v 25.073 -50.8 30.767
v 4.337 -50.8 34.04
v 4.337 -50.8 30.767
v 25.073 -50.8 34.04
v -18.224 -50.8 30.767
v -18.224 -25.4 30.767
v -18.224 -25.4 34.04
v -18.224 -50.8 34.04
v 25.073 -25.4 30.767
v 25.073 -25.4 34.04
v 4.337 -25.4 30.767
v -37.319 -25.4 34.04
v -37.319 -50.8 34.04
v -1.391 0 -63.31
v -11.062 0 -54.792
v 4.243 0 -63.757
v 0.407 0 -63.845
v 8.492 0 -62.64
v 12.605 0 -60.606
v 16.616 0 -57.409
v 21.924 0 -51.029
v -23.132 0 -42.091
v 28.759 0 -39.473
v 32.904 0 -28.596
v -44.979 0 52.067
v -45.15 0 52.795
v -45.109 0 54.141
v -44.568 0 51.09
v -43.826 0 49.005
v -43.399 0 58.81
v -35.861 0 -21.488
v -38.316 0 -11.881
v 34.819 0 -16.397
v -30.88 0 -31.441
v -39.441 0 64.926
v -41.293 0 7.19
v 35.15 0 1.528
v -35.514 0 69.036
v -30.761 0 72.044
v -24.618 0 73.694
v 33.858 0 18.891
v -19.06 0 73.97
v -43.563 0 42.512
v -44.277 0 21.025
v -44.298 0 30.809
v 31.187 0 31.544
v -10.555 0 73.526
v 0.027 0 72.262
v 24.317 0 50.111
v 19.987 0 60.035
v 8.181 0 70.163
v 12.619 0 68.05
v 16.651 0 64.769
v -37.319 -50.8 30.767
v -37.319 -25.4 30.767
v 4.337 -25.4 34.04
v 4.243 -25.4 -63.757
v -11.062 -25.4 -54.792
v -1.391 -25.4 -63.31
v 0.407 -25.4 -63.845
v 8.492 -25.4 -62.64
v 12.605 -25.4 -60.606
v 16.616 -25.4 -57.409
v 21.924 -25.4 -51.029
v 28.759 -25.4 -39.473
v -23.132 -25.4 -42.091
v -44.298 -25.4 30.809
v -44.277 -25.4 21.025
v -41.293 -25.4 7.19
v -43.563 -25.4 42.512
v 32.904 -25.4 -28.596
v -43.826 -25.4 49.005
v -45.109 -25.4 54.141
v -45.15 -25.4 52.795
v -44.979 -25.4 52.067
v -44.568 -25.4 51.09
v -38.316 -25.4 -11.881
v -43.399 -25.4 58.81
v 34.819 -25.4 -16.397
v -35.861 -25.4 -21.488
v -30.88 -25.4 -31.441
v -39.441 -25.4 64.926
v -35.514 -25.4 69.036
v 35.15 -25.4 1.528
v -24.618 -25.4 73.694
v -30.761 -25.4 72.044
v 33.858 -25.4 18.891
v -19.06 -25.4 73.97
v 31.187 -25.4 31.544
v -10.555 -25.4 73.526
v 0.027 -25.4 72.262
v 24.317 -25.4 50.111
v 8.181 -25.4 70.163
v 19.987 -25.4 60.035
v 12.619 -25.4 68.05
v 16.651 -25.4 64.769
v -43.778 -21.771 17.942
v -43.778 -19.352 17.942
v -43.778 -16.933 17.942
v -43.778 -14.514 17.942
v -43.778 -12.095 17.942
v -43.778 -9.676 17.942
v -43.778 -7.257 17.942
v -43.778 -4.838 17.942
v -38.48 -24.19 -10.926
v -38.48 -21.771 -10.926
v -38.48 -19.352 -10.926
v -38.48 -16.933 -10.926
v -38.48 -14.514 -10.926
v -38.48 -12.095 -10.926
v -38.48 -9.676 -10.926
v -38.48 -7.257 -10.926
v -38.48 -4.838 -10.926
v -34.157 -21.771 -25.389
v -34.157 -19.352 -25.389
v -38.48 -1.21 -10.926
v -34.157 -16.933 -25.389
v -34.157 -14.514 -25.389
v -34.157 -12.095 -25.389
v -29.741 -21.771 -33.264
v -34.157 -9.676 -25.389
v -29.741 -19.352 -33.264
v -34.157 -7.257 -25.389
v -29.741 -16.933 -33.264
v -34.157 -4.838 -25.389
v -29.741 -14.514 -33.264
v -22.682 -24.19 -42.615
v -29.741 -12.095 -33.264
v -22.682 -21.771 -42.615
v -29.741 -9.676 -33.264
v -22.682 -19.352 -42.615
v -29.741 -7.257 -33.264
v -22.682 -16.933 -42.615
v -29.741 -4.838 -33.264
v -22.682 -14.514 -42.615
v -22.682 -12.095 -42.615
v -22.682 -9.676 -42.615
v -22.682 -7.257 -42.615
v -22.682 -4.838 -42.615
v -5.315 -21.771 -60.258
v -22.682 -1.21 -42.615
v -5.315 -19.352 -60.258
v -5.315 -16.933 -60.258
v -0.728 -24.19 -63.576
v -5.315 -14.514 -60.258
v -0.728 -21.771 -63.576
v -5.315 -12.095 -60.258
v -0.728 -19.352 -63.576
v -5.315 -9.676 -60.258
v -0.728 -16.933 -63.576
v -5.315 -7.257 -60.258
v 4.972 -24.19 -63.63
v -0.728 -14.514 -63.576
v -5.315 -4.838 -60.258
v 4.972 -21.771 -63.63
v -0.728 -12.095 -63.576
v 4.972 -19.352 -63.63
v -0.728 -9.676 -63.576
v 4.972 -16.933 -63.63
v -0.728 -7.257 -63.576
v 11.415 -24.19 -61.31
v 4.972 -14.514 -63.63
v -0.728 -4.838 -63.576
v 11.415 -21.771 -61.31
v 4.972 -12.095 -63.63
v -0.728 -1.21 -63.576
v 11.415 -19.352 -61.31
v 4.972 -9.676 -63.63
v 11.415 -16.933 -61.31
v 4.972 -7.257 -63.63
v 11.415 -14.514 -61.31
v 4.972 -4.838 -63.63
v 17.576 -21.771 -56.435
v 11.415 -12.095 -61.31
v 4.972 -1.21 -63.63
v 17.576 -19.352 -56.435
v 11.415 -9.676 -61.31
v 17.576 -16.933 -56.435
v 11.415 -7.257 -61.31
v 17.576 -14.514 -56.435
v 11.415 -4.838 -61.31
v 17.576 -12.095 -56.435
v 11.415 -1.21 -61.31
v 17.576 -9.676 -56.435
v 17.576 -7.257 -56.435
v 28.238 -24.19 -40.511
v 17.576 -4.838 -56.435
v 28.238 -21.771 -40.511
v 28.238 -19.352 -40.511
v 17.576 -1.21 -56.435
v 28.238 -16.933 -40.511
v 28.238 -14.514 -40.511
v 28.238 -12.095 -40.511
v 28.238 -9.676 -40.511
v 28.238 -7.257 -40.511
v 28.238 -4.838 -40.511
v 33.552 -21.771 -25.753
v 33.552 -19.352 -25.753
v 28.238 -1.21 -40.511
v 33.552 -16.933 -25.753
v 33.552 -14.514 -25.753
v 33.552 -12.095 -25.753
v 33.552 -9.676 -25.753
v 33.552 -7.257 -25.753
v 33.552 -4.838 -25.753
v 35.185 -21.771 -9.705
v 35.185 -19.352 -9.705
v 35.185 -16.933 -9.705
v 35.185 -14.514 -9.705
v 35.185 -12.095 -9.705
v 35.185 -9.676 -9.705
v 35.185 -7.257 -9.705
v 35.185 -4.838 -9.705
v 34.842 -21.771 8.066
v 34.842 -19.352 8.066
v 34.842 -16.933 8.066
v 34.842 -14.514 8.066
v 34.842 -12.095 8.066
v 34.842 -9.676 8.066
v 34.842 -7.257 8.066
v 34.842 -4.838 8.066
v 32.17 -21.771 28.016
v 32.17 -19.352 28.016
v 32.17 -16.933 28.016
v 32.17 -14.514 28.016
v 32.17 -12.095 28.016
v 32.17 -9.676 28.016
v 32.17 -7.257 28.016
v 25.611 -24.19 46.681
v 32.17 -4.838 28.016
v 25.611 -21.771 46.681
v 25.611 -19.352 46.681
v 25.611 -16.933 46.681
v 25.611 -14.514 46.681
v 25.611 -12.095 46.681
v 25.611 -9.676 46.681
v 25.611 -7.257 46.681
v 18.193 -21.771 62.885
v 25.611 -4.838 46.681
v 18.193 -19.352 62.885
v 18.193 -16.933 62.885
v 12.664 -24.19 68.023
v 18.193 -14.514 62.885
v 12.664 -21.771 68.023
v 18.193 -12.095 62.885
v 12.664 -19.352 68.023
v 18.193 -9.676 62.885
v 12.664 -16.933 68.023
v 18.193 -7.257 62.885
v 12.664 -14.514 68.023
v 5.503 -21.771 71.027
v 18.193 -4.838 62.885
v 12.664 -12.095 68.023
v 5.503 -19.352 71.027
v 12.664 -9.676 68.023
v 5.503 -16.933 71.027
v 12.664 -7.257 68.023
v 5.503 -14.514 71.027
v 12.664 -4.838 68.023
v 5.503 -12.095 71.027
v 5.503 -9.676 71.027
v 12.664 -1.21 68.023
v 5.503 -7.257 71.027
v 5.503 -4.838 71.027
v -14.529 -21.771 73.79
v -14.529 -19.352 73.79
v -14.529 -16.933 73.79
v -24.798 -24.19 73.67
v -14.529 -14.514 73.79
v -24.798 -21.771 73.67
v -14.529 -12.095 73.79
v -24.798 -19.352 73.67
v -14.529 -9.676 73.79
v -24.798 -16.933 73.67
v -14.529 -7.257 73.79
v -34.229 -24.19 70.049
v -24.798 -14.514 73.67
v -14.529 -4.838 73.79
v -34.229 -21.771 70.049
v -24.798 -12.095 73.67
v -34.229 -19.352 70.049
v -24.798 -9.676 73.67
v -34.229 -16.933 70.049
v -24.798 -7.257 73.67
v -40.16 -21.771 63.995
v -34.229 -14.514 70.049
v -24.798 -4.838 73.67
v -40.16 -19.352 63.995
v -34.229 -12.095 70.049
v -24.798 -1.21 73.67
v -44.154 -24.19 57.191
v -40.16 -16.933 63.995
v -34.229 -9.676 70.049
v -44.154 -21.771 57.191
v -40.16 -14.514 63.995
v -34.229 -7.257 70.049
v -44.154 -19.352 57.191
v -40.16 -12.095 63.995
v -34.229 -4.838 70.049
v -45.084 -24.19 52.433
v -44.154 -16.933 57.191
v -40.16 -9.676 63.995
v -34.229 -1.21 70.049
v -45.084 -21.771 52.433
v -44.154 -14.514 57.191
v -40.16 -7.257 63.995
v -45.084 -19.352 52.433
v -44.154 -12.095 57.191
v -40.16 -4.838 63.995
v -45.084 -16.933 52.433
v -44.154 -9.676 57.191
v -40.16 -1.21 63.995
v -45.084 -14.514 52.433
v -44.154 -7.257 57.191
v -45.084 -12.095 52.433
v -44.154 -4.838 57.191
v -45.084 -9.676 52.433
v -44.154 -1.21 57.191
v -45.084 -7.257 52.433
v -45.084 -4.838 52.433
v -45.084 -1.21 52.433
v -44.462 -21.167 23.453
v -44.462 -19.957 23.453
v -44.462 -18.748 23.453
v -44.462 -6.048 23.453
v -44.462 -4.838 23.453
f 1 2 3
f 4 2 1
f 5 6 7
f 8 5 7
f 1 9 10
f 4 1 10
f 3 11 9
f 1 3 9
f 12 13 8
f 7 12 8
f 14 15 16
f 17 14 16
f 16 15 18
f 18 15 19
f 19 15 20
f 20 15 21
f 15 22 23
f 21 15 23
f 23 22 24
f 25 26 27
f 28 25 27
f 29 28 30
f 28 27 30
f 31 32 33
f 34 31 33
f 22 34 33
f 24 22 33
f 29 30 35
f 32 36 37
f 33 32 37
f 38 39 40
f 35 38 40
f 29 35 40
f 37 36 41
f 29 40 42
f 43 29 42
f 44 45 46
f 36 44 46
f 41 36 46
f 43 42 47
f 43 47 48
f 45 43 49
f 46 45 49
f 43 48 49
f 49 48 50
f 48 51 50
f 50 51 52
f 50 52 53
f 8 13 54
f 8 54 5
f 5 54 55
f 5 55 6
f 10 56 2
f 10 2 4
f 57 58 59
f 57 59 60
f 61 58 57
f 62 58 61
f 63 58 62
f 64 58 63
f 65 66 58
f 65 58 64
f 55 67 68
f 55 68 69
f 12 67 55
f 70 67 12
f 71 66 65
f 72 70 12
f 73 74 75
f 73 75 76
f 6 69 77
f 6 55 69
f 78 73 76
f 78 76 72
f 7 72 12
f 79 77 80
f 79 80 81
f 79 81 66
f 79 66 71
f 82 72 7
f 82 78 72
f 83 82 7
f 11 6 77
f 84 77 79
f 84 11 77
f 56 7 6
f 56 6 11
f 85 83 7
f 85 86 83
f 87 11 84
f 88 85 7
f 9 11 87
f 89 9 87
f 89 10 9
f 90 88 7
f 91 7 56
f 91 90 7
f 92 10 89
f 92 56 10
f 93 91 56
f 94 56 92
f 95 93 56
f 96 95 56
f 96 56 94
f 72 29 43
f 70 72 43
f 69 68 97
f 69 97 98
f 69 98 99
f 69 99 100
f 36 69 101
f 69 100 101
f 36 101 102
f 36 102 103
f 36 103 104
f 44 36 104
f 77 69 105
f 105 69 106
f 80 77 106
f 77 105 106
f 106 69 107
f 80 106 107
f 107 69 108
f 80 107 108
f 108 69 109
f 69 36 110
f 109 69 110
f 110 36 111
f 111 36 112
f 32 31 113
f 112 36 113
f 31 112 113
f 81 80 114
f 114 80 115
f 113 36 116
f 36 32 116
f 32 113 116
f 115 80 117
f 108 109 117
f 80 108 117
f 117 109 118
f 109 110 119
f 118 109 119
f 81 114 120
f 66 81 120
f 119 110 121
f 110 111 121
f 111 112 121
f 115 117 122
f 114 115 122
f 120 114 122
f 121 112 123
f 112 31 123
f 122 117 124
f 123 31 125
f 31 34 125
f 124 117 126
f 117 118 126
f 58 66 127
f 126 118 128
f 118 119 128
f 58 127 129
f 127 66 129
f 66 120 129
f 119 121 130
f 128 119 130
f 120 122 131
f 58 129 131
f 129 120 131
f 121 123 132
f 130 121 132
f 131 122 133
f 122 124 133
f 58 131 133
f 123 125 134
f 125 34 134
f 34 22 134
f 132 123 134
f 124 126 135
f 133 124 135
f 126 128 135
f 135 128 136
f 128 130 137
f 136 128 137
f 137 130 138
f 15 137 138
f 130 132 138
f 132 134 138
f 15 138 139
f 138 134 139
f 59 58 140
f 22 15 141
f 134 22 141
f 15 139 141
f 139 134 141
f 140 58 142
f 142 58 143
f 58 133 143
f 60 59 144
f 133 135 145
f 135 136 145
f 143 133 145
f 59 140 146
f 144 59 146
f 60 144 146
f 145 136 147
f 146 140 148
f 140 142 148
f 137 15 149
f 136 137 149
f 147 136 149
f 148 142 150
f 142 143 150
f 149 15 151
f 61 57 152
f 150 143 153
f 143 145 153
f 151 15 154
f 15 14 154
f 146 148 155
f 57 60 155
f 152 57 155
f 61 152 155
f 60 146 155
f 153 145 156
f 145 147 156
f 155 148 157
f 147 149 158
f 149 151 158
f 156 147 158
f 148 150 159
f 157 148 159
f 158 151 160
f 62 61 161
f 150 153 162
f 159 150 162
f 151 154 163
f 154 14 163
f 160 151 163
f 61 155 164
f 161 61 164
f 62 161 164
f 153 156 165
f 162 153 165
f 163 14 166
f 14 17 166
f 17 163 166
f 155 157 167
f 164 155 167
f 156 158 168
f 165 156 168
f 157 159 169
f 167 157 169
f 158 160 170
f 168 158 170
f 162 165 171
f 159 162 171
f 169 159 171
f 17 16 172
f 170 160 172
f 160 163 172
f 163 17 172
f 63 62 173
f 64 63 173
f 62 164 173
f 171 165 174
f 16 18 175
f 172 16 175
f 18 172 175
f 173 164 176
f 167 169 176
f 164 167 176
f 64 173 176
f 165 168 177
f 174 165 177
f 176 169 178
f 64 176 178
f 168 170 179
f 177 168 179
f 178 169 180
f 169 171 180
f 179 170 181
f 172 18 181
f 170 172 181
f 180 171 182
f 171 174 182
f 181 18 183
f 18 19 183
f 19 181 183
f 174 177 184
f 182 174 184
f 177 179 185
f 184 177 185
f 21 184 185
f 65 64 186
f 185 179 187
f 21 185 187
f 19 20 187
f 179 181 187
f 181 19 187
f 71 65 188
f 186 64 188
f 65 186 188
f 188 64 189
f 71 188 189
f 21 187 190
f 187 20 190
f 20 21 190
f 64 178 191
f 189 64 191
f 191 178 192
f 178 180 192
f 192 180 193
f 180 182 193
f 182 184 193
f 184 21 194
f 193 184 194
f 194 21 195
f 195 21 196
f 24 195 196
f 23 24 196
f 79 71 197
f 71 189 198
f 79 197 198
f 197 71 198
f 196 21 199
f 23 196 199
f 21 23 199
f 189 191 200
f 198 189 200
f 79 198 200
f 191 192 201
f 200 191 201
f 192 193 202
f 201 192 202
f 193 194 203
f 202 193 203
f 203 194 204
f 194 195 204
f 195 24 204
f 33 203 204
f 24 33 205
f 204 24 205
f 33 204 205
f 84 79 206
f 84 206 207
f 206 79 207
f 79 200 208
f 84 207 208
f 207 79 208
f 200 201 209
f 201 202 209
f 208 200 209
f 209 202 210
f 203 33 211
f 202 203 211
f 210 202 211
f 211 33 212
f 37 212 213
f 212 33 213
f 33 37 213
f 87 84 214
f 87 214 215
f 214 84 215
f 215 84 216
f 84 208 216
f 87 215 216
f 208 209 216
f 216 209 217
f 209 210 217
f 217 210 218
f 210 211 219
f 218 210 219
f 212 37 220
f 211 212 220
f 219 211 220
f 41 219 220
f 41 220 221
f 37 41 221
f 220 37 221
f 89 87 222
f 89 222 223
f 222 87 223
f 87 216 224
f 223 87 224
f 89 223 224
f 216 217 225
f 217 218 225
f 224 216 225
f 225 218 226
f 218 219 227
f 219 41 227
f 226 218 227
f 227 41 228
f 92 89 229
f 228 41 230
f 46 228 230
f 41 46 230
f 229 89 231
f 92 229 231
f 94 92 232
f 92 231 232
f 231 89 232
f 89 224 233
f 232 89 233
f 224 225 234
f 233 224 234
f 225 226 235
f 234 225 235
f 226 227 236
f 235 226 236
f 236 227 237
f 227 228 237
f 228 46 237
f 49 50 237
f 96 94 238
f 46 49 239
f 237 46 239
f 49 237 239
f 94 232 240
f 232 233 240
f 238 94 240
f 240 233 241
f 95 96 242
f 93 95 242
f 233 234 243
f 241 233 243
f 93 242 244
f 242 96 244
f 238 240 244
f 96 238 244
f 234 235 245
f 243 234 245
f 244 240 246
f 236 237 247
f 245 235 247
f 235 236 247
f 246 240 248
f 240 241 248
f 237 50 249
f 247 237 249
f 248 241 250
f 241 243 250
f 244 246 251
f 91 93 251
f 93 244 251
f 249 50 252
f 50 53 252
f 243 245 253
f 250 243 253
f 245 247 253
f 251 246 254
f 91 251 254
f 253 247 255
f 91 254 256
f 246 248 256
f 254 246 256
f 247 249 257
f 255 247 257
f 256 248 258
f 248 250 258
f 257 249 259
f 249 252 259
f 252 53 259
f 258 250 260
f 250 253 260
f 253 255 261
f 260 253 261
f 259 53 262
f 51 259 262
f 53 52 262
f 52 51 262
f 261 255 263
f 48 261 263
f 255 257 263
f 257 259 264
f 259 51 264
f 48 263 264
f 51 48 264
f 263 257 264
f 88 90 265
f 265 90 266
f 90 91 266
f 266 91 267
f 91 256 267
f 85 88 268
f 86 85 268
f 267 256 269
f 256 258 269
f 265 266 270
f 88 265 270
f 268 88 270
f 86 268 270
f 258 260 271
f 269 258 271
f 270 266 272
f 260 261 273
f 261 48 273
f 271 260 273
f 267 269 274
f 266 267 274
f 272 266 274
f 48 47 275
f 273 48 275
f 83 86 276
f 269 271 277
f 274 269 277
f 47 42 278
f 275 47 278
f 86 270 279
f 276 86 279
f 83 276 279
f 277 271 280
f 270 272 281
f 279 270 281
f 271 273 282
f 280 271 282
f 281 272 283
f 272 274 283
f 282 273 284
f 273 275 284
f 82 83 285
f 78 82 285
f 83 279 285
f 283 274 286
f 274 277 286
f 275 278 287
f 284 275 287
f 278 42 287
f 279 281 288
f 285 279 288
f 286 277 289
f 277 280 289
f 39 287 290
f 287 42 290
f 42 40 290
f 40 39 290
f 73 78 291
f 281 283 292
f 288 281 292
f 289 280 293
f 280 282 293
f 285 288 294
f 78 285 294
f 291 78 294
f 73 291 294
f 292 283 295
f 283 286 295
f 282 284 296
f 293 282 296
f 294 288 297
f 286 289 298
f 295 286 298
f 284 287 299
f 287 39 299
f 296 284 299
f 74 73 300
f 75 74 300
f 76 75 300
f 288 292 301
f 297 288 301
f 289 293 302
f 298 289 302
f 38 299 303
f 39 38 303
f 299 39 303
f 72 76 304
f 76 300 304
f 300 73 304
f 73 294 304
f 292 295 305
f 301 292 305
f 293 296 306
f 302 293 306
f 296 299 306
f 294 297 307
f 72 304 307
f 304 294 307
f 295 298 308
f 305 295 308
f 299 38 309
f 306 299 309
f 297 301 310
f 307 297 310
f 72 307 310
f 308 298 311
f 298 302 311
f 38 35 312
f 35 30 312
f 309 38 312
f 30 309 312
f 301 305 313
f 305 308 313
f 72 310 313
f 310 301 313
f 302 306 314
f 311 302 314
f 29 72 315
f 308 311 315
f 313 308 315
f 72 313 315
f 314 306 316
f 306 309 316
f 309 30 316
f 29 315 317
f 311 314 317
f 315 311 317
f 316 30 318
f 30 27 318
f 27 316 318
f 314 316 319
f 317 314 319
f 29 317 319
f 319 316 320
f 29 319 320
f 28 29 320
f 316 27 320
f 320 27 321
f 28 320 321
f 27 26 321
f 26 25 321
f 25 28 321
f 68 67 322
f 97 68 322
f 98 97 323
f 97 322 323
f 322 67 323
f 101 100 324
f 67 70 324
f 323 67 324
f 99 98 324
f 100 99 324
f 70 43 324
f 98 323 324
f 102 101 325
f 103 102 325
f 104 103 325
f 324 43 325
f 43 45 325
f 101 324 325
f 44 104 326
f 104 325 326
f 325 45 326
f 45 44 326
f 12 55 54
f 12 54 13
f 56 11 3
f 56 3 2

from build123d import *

# Parameters (mm, degrees)
F1_DEPTH = 25.4
F2_W     = 19.0945584327
F2_H     = 3.2732058316
F3_DEPTH = 25.4
F4_W     = 20.736461971
F4_H     = 3.2732058316
F5_DEPTH = 25.4


with BuildPart() as f1:
    # F0 (on Front) → F1 (new body)
    with BuildSketch(Plane.XZ):
        with BuildLine():
            add(Edge.make_bspline(
                [(-43.8256375492, 49.0054376423), (-42.7916469696, 44.173791818), (-46.1003508943, 22.2523463295), (-41.2365449541, 11.4018173918), (-38.4468794286, -15.0284204945), (-34.4404053019, -25.5549359592), (-25.5874273702, -41.0013375146), (-5.6752740256, -60.0394326793), (-0.5317638242, -64.582035161), (8.6317494058, -63.3059960665), (18.6127022363, -57.25258167), (29.7997063716, -38.8399710786), (34.0225700596, -26.046605234), (35.4974956894, -10.2236704325), (35.0854384121, 8.1301256606), (33.0903105303, 28.5585849949), (25.5295594833, 46.1545442627), (19.0780176286, 65.1810135254), (5.5546828919, 72.125873235), (-14.7286294195, 74.0832481465), (-35.1407015096, 74.4060534532), (-47.3435715893, 53.0785176575), (-44.2774492649, 51.1166698266), (-43.8256375492, 49.0054376423)],
                knots=[0, 0, 0, 0, 0.0591053589, 0.103607101, 0.1627736267, 0.2027891978, 0.2529713341, 0.3149714192, 0.3448318115, 0.3780579088, 0.4184724188, 0.4727746648, 0.5166830419, 0.5629463952, 0.6139785068, 0.6672696985, 0.7196625185, 0.7712592657, 0.8153987723, 0.8687123638, 0.921567583, 0.9741733685, 1, 1, 1, 1], degree=3))
        make_face()
    extrude(amount=F1_DEPTH)

    # F2 (on face) → F3 (join)
    with BuildSketch(Plane.XZ.offset(25.4)):
        with Locations((-27.7713080868, 32.4034495279)):
            Rectangle(F2_W, F2_H)
    extrude(amount=F3_DEPTH)

    # F4 (on face) → F5 (join)
    with BuildSketch(Plane.XZ.offset(25.4)):
        with Locations((14.7052172106, 32.4034495279)):
            Rectangle(F4_W, F4_H)
    extrude(amount=F5_DEPTH)


solid = f1.part
